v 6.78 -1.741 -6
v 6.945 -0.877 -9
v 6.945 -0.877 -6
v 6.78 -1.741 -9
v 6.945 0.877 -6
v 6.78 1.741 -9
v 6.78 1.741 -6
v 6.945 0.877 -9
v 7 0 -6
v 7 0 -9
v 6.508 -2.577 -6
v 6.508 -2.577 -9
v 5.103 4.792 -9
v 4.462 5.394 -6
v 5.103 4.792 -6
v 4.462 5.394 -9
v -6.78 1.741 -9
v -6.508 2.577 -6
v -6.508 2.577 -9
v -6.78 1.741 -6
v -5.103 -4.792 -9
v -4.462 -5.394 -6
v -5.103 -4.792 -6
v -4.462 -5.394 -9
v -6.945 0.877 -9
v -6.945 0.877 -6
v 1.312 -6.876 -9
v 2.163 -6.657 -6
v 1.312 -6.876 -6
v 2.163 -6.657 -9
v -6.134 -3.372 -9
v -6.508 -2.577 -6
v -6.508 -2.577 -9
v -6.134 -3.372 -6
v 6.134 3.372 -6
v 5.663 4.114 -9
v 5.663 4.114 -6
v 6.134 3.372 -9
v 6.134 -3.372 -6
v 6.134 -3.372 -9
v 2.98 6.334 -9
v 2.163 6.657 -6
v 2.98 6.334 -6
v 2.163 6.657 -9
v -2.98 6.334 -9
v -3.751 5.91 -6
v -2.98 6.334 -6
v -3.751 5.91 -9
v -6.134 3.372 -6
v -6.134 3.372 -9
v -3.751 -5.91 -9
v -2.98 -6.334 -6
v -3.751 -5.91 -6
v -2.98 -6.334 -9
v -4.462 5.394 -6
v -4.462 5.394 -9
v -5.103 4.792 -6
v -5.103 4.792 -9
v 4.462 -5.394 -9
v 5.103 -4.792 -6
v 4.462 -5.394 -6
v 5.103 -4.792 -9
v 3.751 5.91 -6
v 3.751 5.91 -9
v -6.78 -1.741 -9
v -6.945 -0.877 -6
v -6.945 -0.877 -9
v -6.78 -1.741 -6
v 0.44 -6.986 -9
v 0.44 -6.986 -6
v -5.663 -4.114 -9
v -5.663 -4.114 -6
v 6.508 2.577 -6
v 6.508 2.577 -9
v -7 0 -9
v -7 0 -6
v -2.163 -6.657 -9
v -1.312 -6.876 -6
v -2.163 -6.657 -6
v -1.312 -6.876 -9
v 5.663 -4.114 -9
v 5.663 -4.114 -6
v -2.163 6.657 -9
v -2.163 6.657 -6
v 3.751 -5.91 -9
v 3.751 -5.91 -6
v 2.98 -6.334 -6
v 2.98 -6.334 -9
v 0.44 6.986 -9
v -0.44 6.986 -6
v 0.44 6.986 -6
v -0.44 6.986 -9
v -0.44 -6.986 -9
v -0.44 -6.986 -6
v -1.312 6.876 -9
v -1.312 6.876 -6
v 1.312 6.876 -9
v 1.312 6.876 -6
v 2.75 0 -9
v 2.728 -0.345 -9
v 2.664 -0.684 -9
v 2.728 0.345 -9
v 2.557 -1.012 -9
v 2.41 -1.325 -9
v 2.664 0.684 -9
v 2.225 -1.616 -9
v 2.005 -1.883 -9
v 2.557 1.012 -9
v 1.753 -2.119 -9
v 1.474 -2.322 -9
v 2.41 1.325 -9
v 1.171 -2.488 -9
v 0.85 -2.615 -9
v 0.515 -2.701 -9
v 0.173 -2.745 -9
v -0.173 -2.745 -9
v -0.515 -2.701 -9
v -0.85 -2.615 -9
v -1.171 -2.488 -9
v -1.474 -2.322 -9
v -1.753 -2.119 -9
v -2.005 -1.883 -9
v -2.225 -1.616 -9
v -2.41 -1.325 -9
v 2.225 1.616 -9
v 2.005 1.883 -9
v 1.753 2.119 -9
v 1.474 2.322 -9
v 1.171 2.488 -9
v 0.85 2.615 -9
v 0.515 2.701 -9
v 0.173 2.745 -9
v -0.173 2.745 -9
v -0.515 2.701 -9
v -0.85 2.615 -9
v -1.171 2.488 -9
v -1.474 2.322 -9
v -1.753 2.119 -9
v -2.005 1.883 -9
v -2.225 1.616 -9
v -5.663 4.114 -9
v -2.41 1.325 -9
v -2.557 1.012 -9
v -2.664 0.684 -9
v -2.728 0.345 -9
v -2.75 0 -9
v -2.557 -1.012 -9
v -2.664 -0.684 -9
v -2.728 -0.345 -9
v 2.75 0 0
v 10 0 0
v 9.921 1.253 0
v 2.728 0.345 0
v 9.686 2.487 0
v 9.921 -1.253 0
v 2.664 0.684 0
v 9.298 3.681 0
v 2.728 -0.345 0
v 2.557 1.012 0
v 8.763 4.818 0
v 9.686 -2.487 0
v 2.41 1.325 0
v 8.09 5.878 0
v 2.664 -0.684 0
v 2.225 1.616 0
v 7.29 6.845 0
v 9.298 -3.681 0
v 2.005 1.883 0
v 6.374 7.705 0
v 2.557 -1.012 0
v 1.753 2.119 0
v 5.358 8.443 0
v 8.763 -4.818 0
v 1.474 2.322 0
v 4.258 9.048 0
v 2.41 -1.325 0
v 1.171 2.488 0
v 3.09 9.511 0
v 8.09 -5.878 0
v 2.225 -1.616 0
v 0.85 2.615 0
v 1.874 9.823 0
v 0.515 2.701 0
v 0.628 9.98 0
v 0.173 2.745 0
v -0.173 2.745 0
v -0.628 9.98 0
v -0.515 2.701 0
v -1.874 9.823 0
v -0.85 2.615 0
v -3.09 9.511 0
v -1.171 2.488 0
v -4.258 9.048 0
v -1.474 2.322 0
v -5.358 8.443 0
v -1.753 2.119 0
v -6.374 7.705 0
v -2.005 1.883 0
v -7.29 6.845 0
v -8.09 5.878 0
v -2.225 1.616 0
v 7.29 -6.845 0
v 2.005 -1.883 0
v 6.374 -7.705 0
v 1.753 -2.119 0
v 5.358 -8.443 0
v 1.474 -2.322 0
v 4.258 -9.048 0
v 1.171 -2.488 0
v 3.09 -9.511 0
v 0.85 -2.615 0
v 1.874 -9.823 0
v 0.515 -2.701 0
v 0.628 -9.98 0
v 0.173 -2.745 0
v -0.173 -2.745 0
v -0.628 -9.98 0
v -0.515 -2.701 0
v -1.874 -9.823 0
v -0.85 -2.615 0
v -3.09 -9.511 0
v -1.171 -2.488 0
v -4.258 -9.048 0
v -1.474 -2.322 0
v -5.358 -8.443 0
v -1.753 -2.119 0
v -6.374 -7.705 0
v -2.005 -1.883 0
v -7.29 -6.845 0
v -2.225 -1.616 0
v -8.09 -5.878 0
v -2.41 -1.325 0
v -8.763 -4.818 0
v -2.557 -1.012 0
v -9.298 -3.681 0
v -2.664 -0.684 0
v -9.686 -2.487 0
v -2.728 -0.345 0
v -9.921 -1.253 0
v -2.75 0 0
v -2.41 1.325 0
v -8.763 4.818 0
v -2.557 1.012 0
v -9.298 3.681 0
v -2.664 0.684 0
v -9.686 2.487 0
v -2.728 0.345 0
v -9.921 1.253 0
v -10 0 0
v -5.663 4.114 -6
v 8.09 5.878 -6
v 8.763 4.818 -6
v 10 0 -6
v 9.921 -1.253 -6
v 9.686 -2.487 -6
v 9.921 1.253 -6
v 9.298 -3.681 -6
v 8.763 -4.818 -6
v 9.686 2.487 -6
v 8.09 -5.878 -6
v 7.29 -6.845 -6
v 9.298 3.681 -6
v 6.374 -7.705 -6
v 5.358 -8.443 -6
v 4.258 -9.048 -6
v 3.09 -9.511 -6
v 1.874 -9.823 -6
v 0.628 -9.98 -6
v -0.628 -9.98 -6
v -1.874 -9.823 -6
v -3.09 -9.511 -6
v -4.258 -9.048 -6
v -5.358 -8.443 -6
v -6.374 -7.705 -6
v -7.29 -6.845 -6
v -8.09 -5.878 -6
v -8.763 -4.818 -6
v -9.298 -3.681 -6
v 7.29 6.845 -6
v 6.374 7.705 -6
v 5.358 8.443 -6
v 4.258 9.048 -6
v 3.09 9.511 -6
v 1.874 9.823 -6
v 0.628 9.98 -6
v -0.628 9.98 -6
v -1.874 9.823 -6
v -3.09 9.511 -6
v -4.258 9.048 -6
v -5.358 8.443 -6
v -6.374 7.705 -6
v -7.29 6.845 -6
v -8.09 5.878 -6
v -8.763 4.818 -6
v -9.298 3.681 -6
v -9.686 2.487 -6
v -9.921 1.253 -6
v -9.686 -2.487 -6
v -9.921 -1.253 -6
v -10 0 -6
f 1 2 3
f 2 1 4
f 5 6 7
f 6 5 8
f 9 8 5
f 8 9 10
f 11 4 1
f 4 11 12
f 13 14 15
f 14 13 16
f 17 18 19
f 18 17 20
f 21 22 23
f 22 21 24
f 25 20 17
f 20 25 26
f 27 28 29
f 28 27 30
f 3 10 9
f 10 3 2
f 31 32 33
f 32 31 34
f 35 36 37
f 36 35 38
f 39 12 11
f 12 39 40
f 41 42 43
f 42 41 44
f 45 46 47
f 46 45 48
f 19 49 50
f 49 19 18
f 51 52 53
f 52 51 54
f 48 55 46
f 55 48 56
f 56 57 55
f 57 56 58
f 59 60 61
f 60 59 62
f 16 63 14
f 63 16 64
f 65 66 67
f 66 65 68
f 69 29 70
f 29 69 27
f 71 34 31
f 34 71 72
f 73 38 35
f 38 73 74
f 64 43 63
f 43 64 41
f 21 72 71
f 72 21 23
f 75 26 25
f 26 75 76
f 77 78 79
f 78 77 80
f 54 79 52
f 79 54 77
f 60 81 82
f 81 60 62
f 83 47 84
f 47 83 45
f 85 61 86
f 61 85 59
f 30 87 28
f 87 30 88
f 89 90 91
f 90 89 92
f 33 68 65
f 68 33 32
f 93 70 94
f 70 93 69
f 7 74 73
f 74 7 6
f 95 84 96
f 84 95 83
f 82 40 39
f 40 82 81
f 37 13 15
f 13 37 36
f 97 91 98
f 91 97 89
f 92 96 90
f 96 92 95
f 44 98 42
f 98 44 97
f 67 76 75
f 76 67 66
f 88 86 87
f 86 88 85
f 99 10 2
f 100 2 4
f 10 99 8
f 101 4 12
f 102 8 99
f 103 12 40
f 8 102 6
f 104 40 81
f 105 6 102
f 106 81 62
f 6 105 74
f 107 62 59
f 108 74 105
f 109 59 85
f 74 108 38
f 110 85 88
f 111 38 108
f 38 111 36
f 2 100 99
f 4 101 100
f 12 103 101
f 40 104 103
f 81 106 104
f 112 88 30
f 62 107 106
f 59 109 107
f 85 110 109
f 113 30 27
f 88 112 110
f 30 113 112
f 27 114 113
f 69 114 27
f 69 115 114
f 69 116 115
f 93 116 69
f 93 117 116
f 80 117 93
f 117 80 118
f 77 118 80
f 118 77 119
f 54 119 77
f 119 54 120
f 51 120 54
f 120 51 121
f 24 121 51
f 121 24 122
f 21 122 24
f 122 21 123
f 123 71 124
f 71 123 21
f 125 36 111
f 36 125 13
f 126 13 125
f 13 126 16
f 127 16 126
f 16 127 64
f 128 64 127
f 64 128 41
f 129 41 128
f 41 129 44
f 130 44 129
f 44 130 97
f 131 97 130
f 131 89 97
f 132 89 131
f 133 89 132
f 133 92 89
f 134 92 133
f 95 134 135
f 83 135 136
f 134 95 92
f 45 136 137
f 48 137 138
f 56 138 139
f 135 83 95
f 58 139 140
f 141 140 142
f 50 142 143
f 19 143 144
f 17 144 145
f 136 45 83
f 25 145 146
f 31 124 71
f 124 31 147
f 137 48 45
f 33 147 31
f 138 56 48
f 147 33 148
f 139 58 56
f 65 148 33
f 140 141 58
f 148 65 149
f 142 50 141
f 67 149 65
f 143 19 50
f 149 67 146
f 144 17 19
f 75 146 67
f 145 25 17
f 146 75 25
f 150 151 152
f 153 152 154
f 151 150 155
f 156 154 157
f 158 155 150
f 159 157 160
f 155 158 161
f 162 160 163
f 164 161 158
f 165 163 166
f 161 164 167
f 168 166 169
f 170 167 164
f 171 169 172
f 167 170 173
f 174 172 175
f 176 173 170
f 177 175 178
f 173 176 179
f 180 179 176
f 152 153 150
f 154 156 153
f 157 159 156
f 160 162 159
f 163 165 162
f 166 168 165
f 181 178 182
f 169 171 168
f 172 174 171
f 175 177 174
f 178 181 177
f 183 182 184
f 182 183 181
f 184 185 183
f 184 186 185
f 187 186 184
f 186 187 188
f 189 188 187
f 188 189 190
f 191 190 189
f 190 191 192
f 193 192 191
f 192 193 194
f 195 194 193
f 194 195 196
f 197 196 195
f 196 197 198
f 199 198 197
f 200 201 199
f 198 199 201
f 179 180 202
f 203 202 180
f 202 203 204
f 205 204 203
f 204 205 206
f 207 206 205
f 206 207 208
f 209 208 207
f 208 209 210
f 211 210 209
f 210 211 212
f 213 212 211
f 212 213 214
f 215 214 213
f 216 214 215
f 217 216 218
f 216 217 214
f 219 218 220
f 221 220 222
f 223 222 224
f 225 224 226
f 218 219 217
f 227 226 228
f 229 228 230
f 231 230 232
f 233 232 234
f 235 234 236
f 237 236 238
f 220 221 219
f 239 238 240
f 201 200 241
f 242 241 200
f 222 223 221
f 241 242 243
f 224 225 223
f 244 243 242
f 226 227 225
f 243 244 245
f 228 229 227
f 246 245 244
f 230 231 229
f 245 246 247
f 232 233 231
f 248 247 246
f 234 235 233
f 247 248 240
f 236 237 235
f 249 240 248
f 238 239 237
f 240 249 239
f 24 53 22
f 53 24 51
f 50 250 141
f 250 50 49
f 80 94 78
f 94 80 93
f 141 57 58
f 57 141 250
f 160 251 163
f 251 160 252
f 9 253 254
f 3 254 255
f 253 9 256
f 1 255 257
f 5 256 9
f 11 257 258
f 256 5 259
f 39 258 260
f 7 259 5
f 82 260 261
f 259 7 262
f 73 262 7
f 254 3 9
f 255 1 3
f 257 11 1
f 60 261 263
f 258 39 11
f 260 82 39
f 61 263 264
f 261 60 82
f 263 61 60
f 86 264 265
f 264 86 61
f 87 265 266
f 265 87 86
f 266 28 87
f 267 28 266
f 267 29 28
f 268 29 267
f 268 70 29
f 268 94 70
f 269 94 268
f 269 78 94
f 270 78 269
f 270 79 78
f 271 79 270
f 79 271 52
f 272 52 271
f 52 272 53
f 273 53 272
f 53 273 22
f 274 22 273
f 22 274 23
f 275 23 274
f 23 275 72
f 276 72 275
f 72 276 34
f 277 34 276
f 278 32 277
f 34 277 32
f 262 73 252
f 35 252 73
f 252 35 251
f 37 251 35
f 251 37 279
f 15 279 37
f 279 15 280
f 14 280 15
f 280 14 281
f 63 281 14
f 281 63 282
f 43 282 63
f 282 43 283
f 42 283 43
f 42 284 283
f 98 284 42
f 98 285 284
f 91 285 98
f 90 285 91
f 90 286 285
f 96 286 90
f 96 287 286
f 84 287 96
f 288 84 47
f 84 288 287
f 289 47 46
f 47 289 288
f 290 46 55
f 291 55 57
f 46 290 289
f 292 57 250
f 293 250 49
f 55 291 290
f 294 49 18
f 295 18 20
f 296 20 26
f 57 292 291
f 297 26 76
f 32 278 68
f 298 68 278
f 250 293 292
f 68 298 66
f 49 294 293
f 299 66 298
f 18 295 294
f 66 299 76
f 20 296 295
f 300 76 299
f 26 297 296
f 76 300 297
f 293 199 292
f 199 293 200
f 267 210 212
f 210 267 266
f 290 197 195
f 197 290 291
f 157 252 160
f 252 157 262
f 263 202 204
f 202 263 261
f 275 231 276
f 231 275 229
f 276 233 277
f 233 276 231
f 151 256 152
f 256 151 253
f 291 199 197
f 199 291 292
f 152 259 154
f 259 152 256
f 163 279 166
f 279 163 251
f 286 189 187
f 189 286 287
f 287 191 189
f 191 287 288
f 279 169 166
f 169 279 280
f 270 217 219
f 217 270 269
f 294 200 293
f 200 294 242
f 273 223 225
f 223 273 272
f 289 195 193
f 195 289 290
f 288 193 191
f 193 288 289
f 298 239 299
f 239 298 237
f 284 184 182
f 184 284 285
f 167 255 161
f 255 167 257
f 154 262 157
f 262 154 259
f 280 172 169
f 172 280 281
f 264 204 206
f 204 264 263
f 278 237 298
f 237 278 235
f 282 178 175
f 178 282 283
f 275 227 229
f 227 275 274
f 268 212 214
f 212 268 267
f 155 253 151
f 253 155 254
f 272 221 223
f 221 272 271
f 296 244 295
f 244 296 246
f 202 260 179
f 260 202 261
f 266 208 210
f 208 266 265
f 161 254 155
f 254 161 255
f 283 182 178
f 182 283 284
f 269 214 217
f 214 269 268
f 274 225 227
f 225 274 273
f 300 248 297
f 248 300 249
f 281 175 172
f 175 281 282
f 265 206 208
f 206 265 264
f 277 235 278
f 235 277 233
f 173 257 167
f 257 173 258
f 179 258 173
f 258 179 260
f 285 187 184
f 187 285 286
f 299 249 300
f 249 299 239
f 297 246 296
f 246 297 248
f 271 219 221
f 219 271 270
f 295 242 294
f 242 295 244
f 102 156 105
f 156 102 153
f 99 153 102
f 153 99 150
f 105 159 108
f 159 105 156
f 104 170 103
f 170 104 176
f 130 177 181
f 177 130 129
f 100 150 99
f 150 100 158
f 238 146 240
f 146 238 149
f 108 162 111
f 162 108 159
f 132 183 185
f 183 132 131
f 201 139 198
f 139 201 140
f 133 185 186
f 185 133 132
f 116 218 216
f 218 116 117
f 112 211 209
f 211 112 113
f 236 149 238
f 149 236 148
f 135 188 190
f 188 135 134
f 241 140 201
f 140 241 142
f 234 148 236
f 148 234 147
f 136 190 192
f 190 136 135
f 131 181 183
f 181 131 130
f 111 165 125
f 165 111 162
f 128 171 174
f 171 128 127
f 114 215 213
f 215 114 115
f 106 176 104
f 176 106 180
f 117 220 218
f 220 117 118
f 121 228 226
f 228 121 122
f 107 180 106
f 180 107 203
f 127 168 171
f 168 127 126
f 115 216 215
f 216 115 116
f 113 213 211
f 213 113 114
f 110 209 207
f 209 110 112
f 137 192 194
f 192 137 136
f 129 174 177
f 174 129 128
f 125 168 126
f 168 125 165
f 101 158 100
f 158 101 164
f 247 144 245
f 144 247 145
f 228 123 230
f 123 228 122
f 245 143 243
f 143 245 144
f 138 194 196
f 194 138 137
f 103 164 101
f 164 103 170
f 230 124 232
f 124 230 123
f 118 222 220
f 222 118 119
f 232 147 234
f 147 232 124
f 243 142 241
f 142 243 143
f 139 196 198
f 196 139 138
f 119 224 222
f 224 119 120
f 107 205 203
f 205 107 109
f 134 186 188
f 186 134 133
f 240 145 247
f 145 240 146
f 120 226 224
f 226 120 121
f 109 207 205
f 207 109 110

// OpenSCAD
$fn = 50;


difference() {
	union() {
		translate(v = [0, 0, -9.0000000000]) {
			cylinder(h = 9, r = 7.0000000000);
		}
		translate(v = [0, 0, -6.0000000000]) {
			cylinder(h = 6, r = 10.0000000000);
		}
	}
	union() {
		#translate(v = [0, 0, -9]) {
			cylinder(h = 9, r = 2.7500000000);
		}
	}
}
